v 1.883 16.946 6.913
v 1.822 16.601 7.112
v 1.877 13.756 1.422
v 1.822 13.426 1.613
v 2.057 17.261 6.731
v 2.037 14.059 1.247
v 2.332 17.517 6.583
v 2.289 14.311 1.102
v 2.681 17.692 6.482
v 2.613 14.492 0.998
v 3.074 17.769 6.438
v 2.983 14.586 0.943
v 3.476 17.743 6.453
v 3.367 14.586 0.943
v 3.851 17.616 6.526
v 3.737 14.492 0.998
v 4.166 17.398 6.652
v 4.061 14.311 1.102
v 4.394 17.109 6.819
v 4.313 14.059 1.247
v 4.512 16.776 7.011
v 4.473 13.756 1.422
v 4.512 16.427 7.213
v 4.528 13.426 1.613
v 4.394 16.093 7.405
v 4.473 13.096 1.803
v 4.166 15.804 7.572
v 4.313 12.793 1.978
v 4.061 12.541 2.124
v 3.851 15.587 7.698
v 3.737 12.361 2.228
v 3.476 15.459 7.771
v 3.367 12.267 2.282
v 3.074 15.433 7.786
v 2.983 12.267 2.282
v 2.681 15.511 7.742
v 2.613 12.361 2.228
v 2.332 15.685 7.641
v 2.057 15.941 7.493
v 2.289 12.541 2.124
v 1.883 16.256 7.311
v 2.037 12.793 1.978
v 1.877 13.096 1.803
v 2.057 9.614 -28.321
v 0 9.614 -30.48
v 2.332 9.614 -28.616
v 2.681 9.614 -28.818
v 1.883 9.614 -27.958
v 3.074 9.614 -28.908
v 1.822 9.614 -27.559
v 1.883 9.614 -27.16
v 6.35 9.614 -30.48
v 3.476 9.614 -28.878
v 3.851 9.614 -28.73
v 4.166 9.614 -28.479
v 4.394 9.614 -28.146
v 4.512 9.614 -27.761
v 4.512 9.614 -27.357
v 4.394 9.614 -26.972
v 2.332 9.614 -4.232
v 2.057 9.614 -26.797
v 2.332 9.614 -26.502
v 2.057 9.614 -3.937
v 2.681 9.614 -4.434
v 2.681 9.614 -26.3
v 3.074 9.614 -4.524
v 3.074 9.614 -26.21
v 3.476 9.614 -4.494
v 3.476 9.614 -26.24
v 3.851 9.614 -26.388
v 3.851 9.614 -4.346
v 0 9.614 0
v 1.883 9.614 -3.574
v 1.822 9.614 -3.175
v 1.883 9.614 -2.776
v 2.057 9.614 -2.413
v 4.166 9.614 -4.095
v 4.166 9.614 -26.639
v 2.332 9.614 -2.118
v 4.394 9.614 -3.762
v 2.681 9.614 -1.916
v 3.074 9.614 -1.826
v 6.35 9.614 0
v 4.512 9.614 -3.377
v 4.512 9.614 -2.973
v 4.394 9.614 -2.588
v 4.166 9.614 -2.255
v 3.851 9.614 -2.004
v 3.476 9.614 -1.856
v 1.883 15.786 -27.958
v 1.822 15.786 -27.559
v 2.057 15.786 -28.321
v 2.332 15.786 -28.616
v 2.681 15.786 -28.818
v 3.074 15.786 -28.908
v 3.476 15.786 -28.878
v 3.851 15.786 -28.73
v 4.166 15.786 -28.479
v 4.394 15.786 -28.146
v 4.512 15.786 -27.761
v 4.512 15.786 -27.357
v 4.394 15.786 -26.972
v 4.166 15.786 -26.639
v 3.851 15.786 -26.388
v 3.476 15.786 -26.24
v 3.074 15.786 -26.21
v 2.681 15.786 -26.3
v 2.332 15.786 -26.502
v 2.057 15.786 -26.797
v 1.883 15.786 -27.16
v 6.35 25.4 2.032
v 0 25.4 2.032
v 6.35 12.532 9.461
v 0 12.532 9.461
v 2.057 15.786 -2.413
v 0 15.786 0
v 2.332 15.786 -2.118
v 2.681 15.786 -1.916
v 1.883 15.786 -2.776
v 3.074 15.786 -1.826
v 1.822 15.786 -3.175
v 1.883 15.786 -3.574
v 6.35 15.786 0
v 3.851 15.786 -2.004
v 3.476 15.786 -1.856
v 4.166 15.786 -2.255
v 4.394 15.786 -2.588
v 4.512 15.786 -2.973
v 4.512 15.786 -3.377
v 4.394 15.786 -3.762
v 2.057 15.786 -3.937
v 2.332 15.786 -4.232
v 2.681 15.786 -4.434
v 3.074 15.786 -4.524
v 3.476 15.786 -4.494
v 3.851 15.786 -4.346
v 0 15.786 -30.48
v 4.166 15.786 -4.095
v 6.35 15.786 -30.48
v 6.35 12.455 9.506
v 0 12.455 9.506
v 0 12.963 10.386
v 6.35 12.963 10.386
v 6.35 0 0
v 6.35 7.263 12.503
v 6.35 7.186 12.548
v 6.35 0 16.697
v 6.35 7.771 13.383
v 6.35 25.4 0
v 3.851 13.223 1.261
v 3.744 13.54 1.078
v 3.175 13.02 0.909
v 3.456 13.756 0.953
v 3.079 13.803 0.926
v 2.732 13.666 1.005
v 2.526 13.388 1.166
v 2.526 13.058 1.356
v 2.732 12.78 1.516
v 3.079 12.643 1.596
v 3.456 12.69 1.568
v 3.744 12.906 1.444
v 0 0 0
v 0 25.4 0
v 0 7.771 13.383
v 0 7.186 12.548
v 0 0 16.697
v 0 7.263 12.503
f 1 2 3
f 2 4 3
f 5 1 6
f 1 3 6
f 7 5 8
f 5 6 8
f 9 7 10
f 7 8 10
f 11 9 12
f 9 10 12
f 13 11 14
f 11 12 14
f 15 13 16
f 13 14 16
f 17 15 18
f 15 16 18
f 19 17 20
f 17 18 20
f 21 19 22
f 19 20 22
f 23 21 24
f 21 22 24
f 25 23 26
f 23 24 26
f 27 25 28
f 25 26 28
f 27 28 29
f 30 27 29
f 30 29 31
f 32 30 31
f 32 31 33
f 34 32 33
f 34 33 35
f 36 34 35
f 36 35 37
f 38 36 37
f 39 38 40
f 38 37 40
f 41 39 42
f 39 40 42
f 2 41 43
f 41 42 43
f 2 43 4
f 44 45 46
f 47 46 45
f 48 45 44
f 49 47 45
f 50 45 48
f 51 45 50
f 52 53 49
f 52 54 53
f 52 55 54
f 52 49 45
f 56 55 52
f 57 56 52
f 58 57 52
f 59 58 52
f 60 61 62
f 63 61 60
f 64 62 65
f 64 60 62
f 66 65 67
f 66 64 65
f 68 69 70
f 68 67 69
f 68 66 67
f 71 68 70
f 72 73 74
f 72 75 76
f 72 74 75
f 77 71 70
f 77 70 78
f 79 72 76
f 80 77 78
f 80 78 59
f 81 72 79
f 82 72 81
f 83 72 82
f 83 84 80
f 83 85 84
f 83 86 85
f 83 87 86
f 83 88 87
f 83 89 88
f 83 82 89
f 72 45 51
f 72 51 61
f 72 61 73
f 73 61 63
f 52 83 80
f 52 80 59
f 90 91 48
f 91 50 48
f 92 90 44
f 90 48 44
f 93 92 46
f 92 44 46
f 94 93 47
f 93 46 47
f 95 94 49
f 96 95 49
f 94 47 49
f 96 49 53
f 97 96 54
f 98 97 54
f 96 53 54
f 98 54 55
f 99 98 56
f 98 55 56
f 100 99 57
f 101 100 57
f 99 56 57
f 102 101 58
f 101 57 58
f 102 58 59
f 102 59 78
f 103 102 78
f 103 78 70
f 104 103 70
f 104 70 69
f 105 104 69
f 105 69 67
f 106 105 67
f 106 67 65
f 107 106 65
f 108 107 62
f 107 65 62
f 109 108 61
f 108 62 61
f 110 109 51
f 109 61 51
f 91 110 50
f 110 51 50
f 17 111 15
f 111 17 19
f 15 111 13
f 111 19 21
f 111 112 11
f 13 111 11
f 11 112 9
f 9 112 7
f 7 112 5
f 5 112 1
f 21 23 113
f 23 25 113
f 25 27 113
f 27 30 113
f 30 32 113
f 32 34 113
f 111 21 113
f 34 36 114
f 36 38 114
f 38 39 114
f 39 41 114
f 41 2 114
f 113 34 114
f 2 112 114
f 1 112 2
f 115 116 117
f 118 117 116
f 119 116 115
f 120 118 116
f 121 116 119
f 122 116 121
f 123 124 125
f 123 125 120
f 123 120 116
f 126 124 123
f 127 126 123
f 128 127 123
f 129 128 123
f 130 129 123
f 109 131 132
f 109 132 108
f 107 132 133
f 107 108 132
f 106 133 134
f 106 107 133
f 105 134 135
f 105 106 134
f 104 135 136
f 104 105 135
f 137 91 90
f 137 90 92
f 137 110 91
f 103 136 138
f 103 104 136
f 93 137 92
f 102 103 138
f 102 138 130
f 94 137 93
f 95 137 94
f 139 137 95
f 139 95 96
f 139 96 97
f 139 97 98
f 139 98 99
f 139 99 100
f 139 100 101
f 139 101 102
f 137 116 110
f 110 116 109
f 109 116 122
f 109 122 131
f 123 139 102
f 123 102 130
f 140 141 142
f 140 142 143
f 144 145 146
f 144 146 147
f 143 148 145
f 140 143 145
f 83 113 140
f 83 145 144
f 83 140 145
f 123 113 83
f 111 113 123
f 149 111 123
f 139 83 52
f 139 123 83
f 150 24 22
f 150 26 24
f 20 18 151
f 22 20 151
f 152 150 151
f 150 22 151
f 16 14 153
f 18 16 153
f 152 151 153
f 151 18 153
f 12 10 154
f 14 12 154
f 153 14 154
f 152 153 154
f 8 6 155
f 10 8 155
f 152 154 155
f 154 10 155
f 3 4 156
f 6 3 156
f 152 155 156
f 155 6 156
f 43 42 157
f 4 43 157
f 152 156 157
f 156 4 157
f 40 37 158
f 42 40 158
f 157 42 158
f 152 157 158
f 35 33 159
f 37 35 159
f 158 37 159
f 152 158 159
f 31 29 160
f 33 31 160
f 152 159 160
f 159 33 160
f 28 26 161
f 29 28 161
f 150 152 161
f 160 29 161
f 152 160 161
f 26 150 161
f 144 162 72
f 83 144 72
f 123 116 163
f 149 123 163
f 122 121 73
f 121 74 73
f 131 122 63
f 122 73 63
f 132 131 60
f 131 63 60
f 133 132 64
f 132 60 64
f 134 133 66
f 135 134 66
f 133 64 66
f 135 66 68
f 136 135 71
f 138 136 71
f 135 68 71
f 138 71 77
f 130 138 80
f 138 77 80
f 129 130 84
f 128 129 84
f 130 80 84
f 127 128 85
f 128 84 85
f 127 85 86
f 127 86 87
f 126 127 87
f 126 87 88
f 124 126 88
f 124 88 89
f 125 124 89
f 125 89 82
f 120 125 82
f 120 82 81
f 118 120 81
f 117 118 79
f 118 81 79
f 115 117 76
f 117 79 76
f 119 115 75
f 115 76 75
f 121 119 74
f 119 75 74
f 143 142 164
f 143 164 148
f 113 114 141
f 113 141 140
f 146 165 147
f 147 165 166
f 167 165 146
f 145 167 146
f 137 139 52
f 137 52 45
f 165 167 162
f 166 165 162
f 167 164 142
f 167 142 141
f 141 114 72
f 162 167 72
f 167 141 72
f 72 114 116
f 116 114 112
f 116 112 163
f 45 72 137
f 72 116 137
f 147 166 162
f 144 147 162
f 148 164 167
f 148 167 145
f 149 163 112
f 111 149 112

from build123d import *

# Parameters (mm, degrees)
BOSS_EXTRUDE1_DEPTH           = 6.35
SKETCH2_W                     = 6.35
SKETCH2_H                     = 6.35
BOSS_EXTRUDE2_DEPTH           = 30.48
SKETCH10_W                    = 6.35
SKETCH10_H                    = 6.1722
BOSS_EXTRUDE3_DEPTH           = 1.016
TAP_DRILL_FOR_6_32_TAP4_D     = 2.7051
TAP_DRILL_FOR_6_32_TAP4_DEPTH = 6.35
TAP_DRILL_FOR_6_32_TAP4_TIP   = 0.81269403
TAP_DRILL_FOR_6_32_TAP3_D     = 2.7051
SKETCH13_W                    = 6.35
SKETCH13_H                    = 30.48
CUT_EXTRUDE1_DEPTH            = 0.0889
SKETCH14_W                    = 6.35
SKETCH14_H                    = 30.48
CUT_EXTRUDE2_DEPTH            = 0.0889
SKETCH15_W                    = 6.35
SKETCH15_H                    = 1.016
CUT_EXTRUDE3_DEPTH            = 0.0889
SKETCH16_W                    = 6.35
SKETCH16_H                    = 1.016
CUT_EXTRUDE4_DEPTH            = 0.0889


with BuildPart() as part:
    # Sketch1 → Boss-Extrude1 (new body)
    with BuildSketch(Plane(origin=(0, 0, 0), x_dir=(0, 0, -1), z_dir=(1, 0, 0))):
        Polygon((0, 0), (0, 25.4), (-2.032, 25.4), (-16.696696837, 0), align=None)
    extrude(amount=BOSS_EXTRUDE1_DEPTH)

    # Sketch2 → Boss-Extrude2 (add)
    with BuildSketch(Plane(origin=(0, 0, 0), x_dir=(-1, 0, 0), z_dir=(0, 0, -1))):
        with Locations((-3.175, 12.7)):
            Rectangle(SKETCH2_W, SKETCH2_H)
    extrude(amount=BOSS_EXTRUDE2_DEPTH)

    # Sketch10 → Boss-Extrude3 (add)
    with BuildSketch(Plane(origin=(0, 7.22988181, 12.522522628), x_dir=(1, 0, 0), z_dir=(0, 0.49999999999999467, 0.8660254037844417))):
        with Locations((3.175, 3.035945256)):
            Rectangle(SKETCH10_W, SKETCH10_H)
    extrude(amount=BOSS_EXTRUDE3_DEPTH)

    # Tap Drill for #6-32 Tap4
    with Locations(Plane(origin=(0, 7.22988181, 12.522522628), x_dir=(1, 0, 0), z_dir=(0, 0.49999999999999467, 0.8660254037844417))):
        with Locations((3.175, 10.821045256)):
            Hole(TAP_DRILL_FOR_6_32_TAP4_D / 2, depth=TAP_DRILL_FOR_6_32_TAP4_DEPTH)
            with Locations((0, 0, -(TAP_DRILL_FOR_6_32_TAP4_DEPTH + TAP_DRILL_FOR_6_32_TAP4_TIP / 2))):  # 118° drill point
                Cone(0, TAP_DRILL_FOR_6_32_TAP4_D / 2, TAP_DRILL_FOR_6_32_TAP4_TIP, mode=Mode.SUBTRACT)

    # Tap Drill for #6-32 Tap3 (through all)
    with Locations(Plane(origin=(0, 15.875, 0), x_dir=(1, 0, 0), z_dir=(0, 1, 0))):
        with Locations((3.175, 3.175), (3.175, 27.559)):
            Hole(TAP_DRILL_FOR_6_32_TAP3_D / 2)

    # Sketch13 → Cut-Extrude1 (cut)
    with BuildSketch(Plane(origin=(0, 15.875, 0), x_dir=(1, 0, 0), z_dir=(0, 1, 0))):
        with Locations((3.175, 15.24)):
            Rectangle(SKETCH13_W, SKETCH13_H)
    extrude(amount=-CUT_EXTRUDE1_DEPTH, mode=Mode.SUBTRACT)

    # Sketch14 → Cut-Extrude2 (cut)
    with BuildSketch(Plane.XZ.offset(-9.525)):
        with Locations((3.175, -15.24)):
            Rectangle(SKETCH14_W, SKETCH14_H)
    extrude(amount=-CUT_EXTRUDE2_DEPTH, mode=Mode.SUBTRACT)

    # Sketch15 → Cut-Extrude3 (cut)
    with BuildSketch(Plane(origin=(0, 5.301846715, -3.061022628), x_dir=(1, 0, 0), z_dir=(0, 0.8660254037844417, -0.49999999999999467))):
        with Locations((3.175, -14.96776362)):
            Rectangle(SKETCH15_W, SKETCH15_H)
    extrude(amount=-CUT_EXTRUDE3_DEPTH, mode=Mode.SUBTRACT)

    # Sketch16 → Cut-Extrude4 (cut)
    with BuildSketch(Plane(origin=(0, -0.043435282, 0.025077372), x_dir=(1, 0, 0), z_dir=(0, -0.8660254037844417, 0.49999999999999467))):
        with Locations((3.175, 14.96776362)):
            Rectangle(SKETCH16_W, SKETCH16_H)
    extrude(amount=-CUT_EXTRUDE4_DEPTH, mode=Mode.SUBTRACT)


solid = part.part
